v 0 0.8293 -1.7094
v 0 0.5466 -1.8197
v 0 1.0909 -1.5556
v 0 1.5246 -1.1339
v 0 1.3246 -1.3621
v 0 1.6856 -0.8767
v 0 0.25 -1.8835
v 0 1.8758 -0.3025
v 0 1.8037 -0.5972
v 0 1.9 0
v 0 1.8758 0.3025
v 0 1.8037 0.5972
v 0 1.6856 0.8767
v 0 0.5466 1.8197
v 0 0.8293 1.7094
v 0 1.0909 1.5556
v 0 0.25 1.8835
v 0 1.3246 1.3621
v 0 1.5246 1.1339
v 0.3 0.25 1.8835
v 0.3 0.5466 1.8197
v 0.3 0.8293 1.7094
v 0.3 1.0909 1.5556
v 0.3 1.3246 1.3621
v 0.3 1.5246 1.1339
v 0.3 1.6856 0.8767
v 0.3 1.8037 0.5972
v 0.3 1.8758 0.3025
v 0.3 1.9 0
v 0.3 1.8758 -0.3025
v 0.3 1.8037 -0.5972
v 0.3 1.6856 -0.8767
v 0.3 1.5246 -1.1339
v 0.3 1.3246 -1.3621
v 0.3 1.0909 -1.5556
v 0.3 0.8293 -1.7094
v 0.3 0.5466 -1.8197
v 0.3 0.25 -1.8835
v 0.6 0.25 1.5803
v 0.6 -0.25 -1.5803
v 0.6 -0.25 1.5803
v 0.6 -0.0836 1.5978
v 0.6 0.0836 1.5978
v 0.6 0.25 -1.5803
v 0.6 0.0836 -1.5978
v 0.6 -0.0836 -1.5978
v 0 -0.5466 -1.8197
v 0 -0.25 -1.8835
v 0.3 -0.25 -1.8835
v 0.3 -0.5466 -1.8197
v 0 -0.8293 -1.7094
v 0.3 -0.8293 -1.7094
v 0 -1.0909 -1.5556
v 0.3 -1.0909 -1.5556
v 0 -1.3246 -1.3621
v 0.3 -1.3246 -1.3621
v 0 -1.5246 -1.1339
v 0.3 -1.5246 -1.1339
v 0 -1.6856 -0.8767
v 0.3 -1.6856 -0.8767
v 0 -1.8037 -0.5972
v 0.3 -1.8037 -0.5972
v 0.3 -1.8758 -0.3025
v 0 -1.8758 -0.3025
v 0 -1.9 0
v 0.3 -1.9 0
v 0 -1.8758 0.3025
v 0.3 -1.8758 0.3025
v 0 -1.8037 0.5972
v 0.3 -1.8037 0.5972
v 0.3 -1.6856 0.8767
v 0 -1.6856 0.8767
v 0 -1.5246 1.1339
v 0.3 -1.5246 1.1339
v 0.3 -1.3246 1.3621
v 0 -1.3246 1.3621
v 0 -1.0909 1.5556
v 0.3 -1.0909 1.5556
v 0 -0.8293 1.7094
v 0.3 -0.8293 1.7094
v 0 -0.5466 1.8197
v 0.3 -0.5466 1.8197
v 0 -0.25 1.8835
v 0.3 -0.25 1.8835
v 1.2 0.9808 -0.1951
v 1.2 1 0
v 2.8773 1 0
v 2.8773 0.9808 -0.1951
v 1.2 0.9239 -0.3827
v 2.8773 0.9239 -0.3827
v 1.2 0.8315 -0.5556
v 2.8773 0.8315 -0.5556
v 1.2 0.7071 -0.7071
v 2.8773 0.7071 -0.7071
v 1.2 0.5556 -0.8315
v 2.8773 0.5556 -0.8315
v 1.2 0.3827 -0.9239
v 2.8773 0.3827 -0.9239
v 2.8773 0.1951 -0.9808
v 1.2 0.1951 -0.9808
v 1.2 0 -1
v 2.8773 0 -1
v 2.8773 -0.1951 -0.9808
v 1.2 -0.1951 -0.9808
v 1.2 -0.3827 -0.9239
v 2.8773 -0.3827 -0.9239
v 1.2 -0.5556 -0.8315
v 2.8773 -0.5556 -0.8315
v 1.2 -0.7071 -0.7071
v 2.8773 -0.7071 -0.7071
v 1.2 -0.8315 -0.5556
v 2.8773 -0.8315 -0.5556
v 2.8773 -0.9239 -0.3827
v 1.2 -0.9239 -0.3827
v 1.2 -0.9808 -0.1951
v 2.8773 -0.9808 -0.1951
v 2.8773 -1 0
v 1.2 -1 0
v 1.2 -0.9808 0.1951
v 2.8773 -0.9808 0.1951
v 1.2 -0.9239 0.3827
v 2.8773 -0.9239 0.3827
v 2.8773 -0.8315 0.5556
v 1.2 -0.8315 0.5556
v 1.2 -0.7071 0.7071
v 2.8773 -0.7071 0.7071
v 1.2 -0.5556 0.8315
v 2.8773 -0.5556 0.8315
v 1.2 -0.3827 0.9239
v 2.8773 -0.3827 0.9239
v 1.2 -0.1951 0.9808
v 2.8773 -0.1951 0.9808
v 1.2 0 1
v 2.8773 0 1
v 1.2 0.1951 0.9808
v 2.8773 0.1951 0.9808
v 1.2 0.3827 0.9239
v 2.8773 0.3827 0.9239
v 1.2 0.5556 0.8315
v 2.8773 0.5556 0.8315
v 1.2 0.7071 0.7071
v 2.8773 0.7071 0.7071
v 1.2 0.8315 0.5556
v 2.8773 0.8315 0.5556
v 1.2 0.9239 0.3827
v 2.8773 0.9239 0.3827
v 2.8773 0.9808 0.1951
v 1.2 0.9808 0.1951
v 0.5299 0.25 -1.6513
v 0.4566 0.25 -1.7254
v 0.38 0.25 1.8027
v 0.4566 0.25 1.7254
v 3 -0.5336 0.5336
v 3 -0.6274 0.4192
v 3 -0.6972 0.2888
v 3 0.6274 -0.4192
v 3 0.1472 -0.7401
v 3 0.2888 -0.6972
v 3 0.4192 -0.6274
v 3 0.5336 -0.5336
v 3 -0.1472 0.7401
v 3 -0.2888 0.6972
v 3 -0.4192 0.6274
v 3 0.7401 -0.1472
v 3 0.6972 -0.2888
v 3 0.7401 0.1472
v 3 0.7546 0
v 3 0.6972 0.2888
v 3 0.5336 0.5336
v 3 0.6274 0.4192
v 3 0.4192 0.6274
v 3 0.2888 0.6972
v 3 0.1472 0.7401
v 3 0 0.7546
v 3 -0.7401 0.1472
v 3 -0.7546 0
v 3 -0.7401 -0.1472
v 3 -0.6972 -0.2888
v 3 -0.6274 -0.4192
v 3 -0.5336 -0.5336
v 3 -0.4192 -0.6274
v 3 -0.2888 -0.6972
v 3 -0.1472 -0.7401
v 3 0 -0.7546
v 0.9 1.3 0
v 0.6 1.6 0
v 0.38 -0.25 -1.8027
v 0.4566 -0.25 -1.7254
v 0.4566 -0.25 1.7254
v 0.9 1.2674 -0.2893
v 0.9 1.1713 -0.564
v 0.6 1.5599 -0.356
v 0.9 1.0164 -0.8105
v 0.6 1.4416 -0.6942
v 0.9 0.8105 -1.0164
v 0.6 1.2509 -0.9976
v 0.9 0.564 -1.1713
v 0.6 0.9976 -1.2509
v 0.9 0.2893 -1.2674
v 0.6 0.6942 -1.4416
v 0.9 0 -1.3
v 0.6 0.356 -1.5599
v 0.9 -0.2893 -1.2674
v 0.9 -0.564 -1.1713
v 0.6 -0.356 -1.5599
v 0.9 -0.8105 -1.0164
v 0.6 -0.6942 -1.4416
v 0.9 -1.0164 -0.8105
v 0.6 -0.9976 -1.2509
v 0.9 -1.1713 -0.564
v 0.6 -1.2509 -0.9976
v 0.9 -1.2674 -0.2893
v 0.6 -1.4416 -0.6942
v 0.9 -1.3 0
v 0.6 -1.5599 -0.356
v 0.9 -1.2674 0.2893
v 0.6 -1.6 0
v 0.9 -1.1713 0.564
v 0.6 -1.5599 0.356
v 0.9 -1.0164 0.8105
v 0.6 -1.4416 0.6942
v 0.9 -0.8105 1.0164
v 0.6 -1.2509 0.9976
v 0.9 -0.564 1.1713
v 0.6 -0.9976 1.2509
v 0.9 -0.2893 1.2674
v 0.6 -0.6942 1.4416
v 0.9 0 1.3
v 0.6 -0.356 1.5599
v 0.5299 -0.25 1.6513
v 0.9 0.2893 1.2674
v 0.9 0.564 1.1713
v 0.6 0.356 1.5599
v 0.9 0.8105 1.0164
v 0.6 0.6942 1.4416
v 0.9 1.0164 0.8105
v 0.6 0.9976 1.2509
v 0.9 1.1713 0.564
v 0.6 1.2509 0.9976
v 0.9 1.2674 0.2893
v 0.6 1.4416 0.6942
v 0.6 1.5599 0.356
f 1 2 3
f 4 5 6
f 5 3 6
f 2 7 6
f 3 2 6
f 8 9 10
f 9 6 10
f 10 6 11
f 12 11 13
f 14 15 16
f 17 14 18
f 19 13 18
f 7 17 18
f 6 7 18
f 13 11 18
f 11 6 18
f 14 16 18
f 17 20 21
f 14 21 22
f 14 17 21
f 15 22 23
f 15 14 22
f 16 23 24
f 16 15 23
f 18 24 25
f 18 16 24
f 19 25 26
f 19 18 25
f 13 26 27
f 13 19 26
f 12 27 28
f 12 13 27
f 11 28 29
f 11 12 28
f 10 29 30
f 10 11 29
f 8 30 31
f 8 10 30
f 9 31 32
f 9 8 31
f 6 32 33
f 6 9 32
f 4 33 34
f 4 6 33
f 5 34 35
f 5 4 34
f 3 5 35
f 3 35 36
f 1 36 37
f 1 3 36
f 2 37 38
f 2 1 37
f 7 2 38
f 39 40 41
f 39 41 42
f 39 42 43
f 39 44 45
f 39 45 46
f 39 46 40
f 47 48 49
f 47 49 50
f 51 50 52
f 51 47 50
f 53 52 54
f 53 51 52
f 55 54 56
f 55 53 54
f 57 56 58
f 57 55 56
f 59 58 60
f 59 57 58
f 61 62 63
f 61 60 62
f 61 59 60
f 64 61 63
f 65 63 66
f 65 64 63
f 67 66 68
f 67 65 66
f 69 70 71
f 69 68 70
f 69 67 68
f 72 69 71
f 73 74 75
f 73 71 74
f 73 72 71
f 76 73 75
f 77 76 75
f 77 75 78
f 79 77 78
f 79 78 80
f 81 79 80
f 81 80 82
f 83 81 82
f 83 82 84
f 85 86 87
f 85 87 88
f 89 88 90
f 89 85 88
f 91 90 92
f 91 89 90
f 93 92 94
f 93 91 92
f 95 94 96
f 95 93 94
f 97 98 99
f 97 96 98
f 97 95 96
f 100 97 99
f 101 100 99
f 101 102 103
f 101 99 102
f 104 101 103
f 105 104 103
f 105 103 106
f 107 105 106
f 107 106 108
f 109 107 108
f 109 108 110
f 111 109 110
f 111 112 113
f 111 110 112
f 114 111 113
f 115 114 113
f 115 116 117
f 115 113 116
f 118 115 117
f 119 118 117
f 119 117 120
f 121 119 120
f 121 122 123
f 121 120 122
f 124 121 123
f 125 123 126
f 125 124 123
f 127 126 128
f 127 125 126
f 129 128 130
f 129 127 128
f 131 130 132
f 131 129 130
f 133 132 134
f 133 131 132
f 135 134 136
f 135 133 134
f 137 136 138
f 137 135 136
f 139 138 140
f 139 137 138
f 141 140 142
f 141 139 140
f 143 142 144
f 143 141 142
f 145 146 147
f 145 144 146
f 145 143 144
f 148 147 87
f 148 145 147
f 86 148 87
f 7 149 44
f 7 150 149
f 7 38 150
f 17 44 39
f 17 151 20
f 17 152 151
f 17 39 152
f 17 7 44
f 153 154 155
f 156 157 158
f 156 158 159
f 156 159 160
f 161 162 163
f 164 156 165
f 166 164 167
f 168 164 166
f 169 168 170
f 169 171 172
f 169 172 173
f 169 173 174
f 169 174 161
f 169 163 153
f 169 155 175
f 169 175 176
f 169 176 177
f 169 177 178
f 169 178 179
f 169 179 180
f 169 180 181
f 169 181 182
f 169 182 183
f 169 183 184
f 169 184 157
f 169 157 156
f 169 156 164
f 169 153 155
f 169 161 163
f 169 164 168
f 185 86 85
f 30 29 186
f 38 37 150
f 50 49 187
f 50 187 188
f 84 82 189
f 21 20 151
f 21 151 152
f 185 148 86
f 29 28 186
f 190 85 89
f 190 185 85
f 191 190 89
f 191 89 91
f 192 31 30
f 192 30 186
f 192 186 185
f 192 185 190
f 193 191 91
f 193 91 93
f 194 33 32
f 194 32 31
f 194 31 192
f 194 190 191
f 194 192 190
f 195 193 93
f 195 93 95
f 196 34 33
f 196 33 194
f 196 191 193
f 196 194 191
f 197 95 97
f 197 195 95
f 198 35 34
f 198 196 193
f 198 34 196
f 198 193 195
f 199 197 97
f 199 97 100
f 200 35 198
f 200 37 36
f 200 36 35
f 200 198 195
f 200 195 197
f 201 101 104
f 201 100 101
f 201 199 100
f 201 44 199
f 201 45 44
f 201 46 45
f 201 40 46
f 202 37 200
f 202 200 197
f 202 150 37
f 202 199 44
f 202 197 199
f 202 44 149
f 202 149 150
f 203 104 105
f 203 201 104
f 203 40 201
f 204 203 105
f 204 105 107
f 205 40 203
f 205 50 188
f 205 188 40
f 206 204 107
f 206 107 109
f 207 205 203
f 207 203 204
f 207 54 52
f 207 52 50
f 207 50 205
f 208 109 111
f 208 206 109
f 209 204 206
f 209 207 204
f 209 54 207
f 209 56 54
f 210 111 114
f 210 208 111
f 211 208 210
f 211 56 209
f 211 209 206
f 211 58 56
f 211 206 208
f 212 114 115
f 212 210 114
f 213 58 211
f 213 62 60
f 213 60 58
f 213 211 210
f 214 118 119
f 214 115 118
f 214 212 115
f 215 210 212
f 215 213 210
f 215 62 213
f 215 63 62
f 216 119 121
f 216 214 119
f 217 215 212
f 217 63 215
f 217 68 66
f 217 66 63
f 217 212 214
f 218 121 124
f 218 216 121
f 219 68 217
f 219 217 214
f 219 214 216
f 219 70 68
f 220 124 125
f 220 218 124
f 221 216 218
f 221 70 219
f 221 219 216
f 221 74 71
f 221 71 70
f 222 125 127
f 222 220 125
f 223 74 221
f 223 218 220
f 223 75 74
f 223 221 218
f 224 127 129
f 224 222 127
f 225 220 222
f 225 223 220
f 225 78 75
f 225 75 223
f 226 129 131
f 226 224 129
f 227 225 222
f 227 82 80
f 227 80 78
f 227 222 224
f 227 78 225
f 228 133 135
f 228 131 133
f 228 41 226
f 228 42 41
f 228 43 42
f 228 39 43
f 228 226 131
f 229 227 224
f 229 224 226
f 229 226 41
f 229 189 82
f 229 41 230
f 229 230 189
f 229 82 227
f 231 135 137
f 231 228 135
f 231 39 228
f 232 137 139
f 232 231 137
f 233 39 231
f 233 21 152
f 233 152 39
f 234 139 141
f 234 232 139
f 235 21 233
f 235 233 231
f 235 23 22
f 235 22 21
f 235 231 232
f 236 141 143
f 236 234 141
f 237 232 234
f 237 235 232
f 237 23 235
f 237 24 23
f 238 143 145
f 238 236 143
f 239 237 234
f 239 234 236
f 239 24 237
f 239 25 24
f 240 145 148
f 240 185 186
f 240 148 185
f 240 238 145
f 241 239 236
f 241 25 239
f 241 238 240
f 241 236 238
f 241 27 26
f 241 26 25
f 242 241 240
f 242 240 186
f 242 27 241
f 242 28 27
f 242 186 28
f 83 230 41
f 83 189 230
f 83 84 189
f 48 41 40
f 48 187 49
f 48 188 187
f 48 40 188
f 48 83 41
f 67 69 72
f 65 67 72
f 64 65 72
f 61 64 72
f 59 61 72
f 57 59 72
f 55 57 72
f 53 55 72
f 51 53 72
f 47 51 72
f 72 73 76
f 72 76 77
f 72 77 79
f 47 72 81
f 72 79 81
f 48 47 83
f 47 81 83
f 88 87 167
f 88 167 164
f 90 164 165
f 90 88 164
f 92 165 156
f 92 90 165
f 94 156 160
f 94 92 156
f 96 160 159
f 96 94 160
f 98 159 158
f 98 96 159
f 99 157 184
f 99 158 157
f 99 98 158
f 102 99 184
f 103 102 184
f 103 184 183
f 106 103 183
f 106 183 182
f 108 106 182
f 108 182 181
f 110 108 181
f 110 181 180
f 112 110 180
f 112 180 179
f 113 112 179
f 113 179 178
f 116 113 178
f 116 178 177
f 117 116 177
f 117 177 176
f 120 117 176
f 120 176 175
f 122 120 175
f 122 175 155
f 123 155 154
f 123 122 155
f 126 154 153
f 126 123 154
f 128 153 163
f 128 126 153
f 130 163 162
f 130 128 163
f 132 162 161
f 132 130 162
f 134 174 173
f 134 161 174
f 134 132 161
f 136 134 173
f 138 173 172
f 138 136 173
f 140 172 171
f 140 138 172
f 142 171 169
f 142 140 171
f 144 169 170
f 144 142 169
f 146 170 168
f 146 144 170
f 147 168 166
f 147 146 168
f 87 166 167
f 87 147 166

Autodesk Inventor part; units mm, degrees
ref_plane "YZ Plane" through (0, 0, 0) normal (1, 0, 0) x (0, 1, 0)
ref_plane "XZ Plane" through (0, 0, 0) normal (0, 1, 0) x (-1, 0, 0)
sketch "Sketch1" plane through (0, 0, 0) normal (0, 0, 1) x (1, 0, 0)
  line L0 (0, 0) -> (3, 0)
  line L1 (3, 0) -> (3, 1)
  line L2 (3, 1) -> (2, 1)
  line L3 (2, 1) -> (1.7546, 1)
  line L4 (1.7546, 1) -> (1.2, 1)
  line L5 (1.2, 1) -> (0.3, 1.9)
  line L6 (0.3, 1.9) -> (0, 1.9)
  line L7 (0, 1.9) -> (0, 0)
  line L8 (2, 1) -> (1.2, 1) construction
  line L9 (-0.6, 0) -> (3.6, 0) projected
  line L10 (0, 2.28) -> (0, -0.38) projected
  dimension "d0" = 3
  dimension "d1" = 45
  dimension "d2" = 0.2454
  dimension "d3" = 1
  dimension "d4" = 1.2
  dimension "d5" = 2
  dimension "d6" = 2
  dimension "d7" = 3.8
revolve "Body" add sketch "Sketch1" angle 360 about axis through (0, 0, 0) along (1, 0, 0)
sketch "Sketch2" plane through (0, 0, 0) normal (-1, 0, 0) x (0, 0, 1)
  line L0 (1.9, -0.25) -> (-1.9, -0.25)
  line L1 (-1.9, -0.25) -> (-1.9, 0.25)
  line L2 (-1.9, 0.25) -> (1.9, 0.25)
  line L3 (1.9, 0.25) -> (1.9, -0.25)
  line L4 (0, 0.25) -> (0, -0.25) construction
  line L5 (-1.9, 0) -> (1.9, 0) construction
  line L6 (0, 1.9) -> (0, 0) projected
  dimension "d15" = 0.5
  dimension "d16" = 3.8
extrude "Slot" cut sketch "Sketch2" against normal blind 0.6
thread "Thread" size "M2x0.4" class "6g" standard "ISO Metric profile" length 1
chamfer "Chamfer1" distance 0.2454 distance2 0.1227 1 edges at (3, -1, 0) measured on face at (3, 0.3275, -0.4215)
ref_plane "Work Plane1" through (33.575, 0, 0) normal (0, 0, -1) x (1, 0, 0)
equation "\"d0\" = NLG"
equation "\"d1\" = 0.5 * SEWI"
equation "\"d2\" = GAL"
equation "\"d3\" = GEL"
equation "\"d4\" = KOH"
equation "\"d5\" = BDM"
equation "\"d6\" = GD"
equation "\"d7\" = KOD"
equation "\"d15\" = SBR"
equation "\"d16\" = KOD"
equation "\"d8\" = STI"
equation "\"d10\" = GEL"
equation "\"d12\" = -0.5 * SPD + 0.5 * GD"
equation "\"d13\" = 0.5 * GAL"
equation "\"NLG\" = 3"
equation "\"GAL\" = 0.61345 * PTC"
equation "\"GEL\" = 1"
equation "\"KOH\" = 1.2"
equation "\"KOD\" = 3.8"
equation "\"SEWI\" = 90deg"
equation "\"BDM\" = NND"
equation "\"GD\" = NND"
equation "\"SBR\" = 0.5"
equation "\"STI\" = 0.6"
equation "\"SPD\" = NND - 1.2269 * PTC"
equation "\"GUL\" = 0.61345 * PTC"
equation "\"PTC\" = 0.4"
equation "\"EPV\" = 2.2"
equation "\"THREADDIA\" = 2"
equation "\"TOA\" = 30deg"
equation "\"NND\" = 2"
equation "\"GD1\" = THREADDIA - 1.2269 * PTC"
properties part number "DIN 963 - M2 x 3" material "Steel, Mild"
